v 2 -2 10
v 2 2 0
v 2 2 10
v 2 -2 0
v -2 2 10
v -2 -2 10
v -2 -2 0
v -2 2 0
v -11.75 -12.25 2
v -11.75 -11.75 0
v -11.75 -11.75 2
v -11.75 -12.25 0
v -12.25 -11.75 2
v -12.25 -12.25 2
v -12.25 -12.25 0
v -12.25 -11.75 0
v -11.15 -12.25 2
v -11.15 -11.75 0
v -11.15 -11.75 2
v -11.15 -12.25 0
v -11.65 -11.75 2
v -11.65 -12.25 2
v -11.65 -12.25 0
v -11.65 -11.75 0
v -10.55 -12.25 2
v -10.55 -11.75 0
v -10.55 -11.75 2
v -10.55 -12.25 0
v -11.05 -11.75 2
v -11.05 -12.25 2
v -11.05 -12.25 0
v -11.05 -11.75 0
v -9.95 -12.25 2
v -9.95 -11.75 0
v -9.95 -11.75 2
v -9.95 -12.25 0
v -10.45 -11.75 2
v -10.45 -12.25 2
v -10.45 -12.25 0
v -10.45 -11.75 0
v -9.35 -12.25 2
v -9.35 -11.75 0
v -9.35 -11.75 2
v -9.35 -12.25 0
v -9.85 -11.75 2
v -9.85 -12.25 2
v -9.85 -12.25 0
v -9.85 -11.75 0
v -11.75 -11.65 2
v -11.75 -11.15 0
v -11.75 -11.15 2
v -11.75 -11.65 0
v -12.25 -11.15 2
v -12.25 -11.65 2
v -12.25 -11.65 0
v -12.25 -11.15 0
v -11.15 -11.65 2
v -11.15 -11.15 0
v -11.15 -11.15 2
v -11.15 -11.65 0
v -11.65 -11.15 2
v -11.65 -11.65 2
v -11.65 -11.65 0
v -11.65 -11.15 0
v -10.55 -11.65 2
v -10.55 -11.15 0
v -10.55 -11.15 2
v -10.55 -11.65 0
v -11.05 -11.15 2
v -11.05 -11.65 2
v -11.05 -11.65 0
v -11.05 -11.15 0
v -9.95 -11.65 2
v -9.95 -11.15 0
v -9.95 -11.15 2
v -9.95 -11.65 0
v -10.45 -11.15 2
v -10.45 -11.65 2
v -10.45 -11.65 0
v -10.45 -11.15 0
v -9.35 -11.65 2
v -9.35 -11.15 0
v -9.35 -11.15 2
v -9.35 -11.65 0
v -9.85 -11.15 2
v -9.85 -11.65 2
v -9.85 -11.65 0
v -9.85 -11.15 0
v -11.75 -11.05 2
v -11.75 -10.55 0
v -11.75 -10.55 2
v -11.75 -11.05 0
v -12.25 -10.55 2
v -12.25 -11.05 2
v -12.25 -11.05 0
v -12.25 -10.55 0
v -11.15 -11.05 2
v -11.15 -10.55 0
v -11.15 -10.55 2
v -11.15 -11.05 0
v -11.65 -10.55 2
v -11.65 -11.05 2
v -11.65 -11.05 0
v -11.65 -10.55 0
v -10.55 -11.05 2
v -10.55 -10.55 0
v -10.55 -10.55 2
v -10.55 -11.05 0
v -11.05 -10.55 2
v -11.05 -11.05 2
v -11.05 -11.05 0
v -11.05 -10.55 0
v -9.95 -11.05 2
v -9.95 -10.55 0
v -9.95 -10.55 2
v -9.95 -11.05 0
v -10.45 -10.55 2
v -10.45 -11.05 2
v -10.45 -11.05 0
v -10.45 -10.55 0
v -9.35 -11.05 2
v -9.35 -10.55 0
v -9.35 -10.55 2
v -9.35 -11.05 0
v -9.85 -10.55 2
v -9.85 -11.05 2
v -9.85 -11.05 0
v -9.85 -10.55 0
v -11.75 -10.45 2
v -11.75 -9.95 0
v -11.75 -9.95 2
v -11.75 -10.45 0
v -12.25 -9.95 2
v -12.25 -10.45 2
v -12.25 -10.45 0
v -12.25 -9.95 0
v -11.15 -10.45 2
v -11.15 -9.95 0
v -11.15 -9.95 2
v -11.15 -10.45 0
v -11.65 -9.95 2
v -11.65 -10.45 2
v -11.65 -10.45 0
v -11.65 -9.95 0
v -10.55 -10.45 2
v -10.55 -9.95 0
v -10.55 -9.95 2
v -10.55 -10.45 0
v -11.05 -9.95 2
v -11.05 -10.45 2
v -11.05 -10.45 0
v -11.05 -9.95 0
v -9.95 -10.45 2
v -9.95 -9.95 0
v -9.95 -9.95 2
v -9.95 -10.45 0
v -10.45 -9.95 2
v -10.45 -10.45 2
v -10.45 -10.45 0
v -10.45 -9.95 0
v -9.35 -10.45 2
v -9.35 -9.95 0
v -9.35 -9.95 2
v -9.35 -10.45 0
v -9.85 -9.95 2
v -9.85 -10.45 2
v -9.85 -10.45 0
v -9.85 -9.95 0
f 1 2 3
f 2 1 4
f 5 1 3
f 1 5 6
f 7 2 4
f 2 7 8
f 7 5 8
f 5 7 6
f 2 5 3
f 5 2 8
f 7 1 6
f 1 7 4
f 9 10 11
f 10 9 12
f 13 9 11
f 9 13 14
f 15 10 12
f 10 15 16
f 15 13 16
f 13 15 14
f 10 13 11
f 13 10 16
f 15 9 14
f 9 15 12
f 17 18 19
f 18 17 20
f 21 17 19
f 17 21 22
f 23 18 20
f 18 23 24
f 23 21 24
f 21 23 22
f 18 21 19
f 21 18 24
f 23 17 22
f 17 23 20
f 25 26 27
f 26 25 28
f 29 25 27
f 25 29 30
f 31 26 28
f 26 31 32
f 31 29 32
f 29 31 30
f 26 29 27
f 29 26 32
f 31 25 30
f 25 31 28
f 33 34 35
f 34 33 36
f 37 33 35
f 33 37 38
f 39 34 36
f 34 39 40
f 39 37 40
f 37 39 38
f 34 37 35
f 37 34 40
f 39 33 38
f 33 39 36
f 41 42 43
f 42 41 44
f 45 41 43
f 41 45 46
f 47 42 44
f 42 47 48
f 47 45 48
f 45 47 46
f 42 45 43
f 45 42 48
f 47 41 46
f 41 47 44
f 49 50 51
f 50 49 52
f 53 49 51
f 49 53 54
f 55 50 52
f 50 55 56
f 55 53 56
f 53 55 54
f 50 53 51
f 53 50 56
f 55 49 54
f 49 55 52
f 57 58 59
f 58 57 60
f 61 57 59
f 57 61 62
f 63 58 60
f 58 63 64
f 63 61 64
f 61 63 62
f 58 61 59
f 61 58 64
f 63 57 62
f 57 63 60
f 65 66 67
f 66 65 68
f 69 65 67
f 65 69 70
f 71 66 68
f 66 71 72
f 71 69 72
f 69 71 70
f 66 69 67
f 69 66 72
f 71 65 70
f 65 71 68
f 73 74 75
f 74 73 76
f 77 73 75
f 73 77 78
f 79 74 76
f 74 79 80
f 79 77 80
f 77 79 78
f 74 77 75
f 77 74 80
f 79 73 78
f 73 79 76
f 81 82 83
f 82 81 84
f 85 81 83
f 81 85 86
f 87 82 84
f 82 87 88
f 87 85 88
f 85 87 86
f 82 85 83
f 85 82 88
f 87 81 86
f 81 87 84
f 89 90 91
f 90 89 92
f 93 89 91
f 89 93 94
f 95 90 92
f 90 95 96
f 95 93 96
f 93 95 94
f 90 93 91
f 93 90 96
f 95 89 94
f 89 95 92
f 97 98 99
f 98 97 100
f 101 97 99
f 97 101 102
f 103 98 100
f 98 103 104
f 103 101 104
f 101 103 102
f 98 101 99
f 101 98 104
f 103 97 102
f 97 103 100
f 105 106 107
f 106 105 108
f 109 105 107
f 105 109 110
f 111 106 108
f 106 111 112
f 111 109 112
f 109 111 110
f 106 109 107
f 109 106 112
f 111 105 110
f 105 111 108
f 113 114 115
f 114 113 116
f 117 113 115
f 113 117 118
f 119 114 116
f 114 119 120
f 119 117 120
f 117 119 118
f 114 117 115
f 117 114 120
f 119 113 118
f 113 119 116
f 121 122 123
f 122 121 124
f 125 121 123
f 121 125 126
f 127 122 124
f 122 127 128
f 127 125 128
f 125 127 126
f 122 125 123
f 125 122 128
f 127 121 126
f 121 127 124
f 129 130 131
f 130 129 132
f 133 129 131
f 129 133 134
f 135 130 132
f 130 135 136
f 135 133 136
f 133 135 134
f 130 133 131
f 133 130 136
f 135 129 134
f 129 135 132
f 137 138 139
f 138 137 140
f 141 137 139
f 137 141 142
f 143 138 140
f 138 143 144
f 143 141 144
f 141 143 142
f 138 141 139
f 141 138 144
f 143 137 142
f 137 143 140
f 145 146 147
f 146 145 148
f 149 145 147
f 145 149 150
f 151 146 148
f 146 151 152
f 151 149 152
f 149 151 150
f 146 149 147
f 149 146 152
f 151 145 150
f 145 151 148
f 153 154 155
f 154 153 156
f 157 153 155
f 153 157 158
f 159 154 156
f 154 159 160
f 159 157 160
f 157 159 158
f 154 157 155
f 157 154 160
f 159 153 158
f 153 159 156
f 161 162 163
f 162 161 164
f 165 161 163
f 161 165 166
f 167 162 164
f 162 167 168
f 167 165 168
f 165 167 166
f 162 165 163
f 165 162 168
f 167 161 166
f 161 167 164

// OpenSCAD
translate([0, 0, 5]) color([0,1,0,0.9]) cube([4, 4, 10], center=true);
translate([-12, -12, 1]) color([1,0,0]) cube([0.5, 0.5, 2], center=true);
translate([-11.4, -12, 1]) color([1,0,0]) cube([0.5, 0.5, 2], center=true);
translate([-10.8, -12, 1]) color([1,0,0]) cube([0.5, 0.5, 2], center=true);
translate([-10.2, -12, 1]) color([1,0,0]) cube([0.5, 0.5, 2], center=true);
translate([-9.6, -12, 1]) color([1,0,0]) cube([0.5, 0.5, 2], center=true);
translate([-12, -11.4, 1]) color([1,0,0]) cube([0.5, 0.5, 2], center=true);
translate([-11.4, -11.4, 1]) color([1,0,0]) cube([0.5, 0.5, 2], center=true);
translate([-10.8, -11.4, 1]) color([1,0,0]) cube([0.5, 0.5, 2], center=true);
translate([-10.2, -11.4, 1]) color([1,0,0]) cube([0.5, 0.5, 2], center=true);
translate([-9.6, -11.4, 1]) color([1,0,0]) cube([0.5, 0.5, 2], center=true);
translate([-12, -10.8, 1]) color([1,0,0]) cube([0.5, 0.5, 2], center=true);
translate([-11.4, -10.8, 1]) color([1,0,0]) cube([0.5, 0.5, 2], center=true);
translate([-10.8, -10.8, 1]) color([1,0,0]) cube([0.5, 0.5, 2], center=true);
translate([-10.2, -10.8, 1]) color([1,0,0]) cube([0.5, 0.5, 2], center=true);
translate([-9.6, -10.8, 1]) color([1,0,0]) cube([0.5, 0.5, 2], center=true);
translate([-12, -10.2, 1]) color([1,0,0]) cube([0.5, 0.5, 2], center=true);
translate([-11.4, -10.2, 1]) color([1,0,0]) cube([0.5, 0.5, 2], center=true);
translate([-10.8, -10.2, 1]) color([1,0,0]) cube([0.5, 0.5, 2], center=true);
translate([-10.2, -10.2, 1]) color([1,0,0]) cube([0.5, 0.5, 2], center=true);
translate([-9.6, -10.2, 1]) color([1,0,0]) cube([0.5, 0.5, 2], center=true);
